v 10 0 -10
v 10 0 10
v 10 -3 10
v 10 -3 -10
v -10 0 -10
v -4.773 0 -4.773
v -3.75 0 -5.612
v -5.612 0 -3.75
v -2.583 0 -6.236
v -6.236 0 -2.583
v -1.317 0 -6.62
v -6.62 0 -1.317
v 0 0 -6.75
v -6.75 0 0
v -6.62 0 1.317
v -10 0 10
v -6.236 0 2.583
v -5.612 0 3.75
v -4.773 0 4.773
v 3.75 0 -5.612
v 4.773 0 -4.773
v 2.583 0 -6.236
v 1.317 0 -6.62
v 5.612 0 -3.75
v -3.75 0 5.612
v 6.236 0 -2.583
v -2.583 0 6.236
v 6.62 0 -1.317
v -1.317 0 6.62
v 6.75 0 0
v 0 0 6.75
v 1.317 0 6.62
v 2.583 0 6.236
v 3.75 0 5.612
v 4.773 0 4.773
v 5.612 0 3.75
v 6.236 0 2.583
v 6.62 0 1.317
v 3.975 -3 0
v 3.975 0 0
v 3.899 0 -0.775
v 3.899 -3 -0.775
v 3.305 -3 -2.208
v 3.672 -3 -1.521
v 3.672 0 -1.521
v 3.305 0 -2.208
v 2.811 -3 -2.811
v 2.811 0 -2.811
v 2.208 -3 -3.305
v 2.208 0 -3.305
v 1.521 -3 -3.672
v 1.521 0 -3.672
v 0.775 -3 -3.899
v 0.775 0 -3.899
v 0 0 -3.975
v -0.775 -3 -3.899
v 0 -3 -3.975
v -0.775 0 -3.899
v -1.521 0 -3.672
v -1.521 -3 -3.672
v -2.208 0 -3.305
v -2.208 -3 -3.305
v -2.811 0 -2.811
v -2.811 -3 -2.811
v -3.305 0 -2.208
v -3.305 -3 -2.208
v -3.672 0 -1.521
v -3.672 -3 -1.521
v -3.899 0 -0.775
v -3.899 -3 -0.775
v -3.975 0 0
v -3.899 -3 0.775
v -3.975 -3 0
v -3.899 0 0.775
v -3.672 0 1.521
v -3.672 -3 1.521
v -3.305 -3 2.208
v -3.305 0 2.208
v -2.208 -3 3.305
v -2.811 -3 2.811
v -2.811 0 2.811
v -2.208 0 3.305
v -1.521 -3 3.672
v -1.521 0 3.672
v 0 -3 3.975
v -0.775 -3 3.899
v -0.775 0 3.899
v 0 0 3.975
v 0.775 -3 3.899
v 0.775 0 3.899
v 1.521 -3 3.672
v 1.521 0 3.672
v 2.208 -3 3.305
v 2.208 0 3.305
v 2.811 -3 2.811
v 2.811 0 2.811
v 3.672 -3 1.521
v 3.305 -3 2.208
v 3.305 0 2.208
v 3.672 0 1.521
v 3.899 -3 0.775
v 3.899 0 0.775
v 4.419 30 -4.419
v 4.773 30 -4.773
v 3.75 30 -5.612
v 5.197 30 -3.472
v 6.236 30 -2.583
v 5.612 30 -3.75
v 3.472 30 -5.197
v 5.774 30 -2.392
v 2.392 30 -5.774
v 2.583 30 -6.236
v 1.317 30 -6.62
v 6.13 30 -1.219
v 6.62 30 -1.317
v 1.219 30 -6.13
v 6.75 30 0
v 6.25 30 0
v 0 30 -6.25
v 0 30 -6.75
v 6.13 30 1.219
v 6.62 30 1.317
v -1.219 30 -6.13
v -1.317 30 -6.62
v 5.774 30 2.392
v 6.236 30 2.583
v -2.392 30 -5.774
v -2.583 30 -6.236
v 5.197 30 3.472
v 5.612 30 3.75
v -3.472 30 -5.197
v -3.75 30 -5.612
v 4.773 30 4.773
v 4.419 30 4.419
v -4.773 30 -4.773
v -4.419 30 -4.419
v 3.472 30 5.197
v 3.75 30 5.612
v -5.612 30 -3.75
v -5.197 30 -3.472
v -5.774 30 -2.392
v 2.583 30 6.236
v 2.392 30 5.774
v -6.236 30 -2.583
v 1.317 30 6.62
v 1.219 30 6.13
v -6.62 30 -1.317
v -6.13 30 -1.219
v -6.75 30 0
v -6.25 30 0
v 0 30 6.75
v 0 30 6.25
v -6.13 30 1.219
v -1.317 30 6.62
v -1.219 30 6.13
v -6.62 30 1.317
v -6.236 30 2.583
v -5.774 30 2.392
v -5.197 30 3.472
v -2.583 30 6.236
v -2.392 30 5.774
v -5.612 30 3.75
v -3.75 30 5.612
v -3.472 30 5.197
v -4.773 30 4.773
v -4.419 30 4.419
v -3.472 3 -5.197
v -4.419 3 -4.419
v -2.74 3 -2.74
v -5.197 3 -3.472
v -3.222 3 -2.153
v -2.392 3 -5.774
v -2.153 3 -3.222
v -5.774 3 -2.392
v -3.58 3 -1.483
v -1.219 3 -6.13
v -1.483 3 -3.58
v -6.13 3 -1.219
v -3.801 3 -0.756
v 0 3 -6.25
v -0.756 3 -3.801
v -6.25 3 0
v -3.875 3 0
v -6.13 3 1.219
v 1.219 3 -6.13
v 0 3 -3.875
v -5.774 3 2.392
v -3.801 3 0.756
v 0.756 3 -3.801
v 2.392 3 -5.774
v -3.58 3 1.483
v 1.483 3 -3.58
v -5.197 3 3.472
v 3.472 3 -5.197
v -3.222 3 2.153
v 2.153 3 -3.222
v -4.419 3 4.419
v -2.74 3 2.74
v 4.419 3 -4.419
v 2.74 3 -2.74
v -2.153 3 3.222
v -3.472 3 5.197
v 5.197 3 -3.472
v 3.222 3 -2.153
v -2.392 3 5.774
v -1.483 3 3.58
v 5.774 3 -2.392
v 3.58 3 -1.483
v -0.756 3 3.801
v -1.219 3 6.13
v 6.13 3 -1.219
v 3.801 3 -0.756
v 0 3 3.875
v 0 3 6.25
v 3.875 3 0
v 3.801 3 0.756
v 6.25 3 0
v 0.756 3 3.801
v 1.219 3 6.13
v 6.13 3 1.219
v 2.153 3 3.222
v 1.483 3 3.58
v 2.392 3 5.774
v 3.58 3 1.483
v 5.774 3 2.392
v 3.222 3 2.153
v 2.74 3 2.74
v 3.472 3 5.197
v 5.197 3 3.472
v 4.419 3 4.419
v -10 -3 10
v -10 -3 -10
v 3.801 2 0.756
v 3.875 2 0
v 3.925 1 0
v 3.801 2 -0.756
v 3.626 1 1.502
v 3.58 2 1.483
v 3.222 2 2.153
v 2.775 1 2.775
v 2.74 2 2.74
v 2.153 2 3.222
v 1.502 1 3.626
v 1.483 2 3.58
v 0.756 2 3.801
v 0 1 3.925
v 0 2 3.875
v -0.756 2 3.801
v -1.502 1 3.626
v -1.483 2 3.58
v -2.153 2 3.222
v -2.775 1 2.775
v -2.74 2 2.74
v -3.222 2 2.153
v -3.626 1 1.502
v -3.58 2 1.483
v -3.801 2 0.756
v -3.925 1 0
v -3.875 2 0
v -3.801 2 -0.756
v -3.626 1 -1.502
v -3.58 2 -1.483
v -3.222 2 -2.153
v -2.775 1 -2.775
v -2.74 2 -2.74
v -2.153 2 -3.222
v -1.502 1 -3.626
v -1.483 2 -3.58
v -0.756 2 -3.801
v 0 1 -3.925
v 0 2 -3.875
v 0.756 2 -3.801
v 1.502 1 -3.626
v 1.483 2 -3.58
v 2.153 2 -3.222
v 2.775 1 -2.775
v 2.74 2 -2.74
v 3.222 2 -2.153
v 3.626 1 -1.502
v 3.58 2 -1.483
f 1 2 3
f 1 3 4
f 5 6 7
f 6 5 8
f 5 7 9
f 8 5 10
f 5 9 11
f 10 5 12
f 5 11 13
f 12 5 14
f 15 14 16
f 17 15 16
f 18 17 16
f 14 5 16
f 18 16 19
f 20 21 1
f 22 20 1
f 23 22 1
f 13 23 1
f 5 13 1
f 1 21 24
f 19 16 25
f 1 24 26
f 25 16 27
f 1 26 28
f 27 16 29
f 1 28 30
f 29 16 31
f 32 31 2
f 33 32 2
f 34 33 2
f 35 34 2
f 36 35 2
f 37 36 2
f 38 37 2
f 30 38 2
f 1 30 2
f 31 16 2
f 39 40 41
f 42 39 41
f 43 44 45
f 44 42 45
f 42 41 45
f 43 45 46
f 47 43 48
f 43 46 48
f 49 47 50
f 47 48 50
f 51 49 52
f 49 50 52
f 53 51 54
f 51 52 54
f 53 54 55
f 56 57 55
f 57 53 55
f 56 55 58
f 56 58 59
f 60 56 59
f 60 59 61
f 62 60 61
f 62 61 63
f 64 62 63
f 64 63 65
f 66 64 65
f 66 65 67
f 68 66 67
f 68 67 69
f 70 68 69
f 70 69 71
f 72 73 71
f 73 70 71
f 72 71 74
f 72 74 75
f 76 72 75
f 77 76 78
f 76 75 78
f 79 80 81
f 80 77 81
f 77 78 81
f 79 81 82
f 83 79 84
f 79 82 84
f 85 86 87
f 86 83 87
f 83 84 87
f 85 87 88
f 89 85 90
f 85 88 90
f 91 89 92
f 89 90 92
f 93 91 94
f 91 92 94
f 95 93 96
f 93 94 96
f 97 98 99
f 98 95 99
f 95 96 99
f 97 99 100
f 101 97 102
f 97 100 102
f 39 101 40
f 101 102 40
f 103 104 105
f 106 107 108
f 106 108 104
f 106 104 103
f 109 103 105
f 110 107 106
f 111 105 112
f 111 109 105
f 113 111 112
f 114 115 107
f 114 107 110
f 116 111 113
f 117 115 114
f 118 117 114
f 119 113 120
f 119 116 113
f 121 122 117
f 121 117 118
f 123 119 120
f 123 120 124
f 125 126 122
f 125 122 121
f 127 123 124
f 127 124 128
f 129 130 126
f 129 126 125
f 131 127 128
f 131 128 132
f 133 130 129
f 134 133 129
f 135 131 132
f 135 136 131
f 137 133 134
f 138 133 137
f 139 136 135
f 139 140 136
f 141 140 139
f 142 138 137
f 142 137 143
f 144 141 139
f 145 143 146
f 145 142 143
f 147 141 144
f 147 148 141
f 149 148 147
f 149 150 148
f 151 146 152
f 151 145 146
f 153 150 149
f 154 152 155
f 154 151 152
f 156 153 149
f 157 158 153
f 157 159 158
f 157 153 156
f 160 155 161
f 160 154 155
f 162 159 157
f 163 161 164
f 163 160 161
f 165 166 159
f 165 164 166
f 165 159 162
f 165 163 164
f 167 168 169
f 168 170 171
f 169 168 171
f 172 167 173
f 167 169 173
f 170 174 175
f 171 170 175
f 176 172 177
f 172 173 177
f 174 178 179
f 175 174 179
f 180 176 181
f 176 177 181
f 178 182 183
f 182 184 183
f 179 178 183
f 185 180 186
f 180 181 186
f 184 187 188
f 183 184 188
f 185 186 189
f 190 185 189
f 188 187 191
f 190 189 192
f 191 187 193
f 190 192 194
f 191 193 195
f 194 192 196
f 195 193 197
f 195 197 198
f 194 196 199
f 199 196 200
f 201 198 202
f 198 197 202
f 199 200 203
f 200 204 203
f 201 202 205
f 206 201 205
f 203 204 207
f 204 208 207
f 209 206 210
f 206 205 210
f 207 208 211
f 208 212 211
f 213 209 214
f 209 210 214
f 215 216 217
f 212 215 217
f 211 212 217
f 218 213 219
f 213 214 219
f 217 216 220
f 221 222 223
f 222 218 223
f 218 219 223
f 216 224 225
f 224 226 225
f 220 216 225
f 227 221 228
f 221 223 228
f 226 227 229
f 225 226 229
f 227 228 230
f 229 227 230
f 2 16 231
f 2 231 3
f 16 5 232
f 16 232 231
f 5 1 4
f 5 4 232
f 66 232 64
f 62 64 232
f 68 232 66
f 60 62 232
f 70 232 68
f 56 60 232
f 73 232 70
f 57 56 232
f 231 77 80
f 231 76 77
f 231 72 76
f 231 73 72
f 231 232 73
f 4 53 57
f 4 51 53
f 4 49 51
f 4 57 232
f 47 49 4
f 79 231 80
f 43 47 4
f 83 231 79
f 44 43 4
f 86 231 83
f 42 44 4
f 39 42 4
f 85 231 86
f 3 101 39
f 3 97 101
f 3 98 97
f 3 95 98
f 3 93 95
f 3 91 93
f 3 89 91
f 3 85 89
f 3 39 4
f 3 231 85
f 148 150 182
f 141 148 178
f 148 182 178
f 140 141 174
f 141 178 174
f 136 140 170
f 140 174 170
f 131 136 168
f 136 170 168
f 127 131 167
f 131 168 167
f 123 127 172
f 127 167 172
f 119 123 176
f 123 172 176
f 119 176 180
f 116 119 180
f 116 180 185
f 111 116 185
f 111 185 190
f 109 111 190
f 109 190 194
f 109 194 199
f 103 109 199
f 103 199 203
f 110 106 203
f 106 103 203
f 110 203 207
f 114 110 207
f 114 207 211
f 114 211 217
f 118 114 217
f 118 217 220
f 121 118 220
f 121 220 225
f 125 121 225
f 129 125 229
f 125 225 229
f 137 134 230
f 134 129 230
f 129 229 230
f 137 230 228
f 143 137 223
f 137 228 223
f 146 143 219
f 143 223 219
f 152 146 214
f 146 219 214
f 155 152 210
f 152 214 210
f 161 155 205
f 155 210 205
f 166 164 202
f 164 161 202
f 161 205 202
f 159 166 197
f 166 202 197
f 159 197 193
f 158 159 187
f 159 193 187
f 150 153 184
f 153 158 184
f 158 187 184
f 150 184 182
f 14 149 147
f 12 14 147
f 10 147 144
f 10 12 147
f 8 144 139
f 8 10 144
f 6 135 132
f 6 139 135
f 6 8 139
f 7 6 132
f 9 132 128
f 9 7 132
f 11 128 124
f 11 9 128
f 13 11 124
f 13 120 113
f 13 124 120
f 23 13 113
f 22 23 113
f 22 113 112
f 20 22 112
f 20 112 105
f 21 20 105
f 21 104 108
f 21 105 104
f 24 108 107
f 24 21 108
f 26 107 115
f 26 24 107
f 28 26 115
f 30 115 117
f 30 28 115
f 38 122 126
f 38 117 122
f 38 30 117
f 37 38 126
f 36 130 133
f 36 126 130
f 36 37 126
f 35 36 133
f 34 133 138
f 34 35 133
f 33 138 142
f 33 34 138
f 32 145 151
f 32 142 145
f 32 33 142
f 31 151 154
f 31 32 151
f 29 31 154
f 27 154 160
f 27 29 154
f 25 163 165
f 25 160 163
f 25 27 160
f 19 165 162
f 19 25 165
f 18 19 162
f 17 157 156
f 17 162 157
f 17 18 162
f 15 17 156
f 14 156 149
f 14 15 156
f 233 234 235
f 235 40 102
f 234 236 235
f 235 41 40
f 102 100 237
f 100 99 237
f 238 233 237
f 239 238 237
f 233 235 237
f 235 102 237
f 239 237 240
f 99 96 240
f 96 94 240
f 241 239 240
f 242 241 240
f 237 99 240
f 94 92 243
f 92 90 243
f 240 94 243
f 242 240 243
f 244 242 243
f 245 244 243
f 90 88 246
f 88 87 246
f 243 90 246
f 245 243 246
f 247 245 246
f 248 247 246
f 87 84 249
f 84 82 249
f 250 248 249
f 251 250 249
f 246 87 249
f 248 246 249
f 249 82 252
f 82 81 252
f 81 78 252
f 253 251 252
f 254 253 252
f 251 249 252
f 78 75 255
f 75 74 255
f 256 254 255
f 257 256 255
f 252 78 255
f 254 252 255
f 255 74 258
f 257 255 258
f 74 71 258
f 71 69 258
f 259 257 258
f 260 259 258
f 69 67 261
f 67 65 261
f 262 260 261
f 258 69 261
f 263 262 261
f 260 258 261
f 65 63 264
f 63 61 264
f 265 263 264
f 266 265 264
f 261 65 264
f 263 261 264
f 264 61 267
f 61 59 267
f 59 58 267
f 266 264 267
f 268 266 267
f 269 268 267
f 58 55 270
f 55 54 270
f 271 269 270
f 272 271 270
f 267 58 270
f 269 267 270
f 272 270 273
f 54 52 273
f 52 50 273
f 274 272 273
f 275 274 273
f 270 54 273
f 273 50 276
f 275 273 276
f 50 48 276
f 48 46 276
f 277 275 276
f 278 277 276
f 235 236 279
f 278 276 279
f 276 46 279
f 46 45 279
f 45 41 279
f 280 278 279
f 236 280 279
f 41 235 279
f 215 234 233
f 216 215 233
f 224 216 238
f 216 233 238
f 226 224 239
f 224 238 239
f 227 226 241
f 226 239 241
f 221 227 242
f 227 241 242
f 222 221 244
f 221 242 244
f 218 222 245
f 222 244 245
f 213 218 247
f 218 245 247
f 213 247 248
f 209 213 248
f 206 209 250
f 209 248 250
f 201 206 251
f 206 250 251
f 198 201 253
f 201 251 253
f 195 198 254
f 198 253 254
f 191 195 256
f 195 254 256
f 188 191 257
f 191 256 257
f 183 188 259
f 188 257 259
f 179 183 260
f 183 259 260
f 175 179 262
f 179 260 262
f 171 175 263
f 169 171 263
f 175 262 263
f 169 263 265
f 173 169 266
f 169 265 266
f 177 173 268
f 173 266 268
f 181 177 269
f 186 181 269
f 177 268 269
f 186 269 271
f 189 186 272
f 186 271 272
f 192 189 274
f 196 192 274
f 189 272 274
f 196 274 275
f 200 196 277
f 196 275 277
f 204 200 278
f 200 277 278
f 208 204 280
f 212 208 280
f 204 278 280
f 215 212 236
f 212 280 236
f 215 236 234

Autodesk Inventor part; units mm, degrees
ref_plane "YZ Plane" through (0, 0, 0) normal (1, 0, 0) x (0, 1, 0)
ref_plane "XZ Plane" through (0, 0, 0) normal (0, 1, 0) x (-1, 0, 0)
ref_plane "XY Plane" through (0, 0, 0) normal (0, 0, 1) x (1, 0, 0)
sketch "Sketch1" plane through (0, 0, 0) normal (0, 1, 0) x (-1, 0, 0)
  circle A0 centre (0, 0) radius 6.75
  circle A1 centre (0, 0) radius 6.25
  dimension "d0" = 13.5
  dimension "d1" = 12.5
extrude "Extrusion1" add sketch "Sketch1" along normal blind 30
sketch "Sketch8" plane through (0, 0, 0) normal (0, -1, 0) x (1, 0, 0)
  circle A0 centre (0, 0) radius 6.25 projected
  circle A1 centre (0, 0) radius 3.875
  dimension "d32" = 7.75
extrude "Extrusion8" add sketch "Sketch8" against normal blind 3
chamfer "Chamfer2" distance 0.1 distance2 2 1 edges at (-3.875, 0, 0) measured on face at (-5.6888, 0, -0.8476)
sketch "Sketch9" plane through (0, 0, 0) normal (0, -1, 0) x (1, 0, 0)
  circle A0 centre (0, 0) radius 3.975
  line L0 (10, -10) -> (-10, -10)
  line L1 (-10, -10) -> (-10, 10)
  line L2 (-10, 10) -> (10, 10)
  line L3 (10, 10) -> (10, -10)
  line L4 (10, -10) -> (-10, 10) construction
  line L5 (-10, -10) -> (10, 10) construction
  dimension "d38" = 20
  dimension "d39" = 20
extrude "Extrusion9" add sketch "Sketch9" along normal blind 3
ref_plane "Work Plane1" through (0, -3, 10) normal (1, 0, 0) x (0, 0, -1)
properties part number "MOULD"
